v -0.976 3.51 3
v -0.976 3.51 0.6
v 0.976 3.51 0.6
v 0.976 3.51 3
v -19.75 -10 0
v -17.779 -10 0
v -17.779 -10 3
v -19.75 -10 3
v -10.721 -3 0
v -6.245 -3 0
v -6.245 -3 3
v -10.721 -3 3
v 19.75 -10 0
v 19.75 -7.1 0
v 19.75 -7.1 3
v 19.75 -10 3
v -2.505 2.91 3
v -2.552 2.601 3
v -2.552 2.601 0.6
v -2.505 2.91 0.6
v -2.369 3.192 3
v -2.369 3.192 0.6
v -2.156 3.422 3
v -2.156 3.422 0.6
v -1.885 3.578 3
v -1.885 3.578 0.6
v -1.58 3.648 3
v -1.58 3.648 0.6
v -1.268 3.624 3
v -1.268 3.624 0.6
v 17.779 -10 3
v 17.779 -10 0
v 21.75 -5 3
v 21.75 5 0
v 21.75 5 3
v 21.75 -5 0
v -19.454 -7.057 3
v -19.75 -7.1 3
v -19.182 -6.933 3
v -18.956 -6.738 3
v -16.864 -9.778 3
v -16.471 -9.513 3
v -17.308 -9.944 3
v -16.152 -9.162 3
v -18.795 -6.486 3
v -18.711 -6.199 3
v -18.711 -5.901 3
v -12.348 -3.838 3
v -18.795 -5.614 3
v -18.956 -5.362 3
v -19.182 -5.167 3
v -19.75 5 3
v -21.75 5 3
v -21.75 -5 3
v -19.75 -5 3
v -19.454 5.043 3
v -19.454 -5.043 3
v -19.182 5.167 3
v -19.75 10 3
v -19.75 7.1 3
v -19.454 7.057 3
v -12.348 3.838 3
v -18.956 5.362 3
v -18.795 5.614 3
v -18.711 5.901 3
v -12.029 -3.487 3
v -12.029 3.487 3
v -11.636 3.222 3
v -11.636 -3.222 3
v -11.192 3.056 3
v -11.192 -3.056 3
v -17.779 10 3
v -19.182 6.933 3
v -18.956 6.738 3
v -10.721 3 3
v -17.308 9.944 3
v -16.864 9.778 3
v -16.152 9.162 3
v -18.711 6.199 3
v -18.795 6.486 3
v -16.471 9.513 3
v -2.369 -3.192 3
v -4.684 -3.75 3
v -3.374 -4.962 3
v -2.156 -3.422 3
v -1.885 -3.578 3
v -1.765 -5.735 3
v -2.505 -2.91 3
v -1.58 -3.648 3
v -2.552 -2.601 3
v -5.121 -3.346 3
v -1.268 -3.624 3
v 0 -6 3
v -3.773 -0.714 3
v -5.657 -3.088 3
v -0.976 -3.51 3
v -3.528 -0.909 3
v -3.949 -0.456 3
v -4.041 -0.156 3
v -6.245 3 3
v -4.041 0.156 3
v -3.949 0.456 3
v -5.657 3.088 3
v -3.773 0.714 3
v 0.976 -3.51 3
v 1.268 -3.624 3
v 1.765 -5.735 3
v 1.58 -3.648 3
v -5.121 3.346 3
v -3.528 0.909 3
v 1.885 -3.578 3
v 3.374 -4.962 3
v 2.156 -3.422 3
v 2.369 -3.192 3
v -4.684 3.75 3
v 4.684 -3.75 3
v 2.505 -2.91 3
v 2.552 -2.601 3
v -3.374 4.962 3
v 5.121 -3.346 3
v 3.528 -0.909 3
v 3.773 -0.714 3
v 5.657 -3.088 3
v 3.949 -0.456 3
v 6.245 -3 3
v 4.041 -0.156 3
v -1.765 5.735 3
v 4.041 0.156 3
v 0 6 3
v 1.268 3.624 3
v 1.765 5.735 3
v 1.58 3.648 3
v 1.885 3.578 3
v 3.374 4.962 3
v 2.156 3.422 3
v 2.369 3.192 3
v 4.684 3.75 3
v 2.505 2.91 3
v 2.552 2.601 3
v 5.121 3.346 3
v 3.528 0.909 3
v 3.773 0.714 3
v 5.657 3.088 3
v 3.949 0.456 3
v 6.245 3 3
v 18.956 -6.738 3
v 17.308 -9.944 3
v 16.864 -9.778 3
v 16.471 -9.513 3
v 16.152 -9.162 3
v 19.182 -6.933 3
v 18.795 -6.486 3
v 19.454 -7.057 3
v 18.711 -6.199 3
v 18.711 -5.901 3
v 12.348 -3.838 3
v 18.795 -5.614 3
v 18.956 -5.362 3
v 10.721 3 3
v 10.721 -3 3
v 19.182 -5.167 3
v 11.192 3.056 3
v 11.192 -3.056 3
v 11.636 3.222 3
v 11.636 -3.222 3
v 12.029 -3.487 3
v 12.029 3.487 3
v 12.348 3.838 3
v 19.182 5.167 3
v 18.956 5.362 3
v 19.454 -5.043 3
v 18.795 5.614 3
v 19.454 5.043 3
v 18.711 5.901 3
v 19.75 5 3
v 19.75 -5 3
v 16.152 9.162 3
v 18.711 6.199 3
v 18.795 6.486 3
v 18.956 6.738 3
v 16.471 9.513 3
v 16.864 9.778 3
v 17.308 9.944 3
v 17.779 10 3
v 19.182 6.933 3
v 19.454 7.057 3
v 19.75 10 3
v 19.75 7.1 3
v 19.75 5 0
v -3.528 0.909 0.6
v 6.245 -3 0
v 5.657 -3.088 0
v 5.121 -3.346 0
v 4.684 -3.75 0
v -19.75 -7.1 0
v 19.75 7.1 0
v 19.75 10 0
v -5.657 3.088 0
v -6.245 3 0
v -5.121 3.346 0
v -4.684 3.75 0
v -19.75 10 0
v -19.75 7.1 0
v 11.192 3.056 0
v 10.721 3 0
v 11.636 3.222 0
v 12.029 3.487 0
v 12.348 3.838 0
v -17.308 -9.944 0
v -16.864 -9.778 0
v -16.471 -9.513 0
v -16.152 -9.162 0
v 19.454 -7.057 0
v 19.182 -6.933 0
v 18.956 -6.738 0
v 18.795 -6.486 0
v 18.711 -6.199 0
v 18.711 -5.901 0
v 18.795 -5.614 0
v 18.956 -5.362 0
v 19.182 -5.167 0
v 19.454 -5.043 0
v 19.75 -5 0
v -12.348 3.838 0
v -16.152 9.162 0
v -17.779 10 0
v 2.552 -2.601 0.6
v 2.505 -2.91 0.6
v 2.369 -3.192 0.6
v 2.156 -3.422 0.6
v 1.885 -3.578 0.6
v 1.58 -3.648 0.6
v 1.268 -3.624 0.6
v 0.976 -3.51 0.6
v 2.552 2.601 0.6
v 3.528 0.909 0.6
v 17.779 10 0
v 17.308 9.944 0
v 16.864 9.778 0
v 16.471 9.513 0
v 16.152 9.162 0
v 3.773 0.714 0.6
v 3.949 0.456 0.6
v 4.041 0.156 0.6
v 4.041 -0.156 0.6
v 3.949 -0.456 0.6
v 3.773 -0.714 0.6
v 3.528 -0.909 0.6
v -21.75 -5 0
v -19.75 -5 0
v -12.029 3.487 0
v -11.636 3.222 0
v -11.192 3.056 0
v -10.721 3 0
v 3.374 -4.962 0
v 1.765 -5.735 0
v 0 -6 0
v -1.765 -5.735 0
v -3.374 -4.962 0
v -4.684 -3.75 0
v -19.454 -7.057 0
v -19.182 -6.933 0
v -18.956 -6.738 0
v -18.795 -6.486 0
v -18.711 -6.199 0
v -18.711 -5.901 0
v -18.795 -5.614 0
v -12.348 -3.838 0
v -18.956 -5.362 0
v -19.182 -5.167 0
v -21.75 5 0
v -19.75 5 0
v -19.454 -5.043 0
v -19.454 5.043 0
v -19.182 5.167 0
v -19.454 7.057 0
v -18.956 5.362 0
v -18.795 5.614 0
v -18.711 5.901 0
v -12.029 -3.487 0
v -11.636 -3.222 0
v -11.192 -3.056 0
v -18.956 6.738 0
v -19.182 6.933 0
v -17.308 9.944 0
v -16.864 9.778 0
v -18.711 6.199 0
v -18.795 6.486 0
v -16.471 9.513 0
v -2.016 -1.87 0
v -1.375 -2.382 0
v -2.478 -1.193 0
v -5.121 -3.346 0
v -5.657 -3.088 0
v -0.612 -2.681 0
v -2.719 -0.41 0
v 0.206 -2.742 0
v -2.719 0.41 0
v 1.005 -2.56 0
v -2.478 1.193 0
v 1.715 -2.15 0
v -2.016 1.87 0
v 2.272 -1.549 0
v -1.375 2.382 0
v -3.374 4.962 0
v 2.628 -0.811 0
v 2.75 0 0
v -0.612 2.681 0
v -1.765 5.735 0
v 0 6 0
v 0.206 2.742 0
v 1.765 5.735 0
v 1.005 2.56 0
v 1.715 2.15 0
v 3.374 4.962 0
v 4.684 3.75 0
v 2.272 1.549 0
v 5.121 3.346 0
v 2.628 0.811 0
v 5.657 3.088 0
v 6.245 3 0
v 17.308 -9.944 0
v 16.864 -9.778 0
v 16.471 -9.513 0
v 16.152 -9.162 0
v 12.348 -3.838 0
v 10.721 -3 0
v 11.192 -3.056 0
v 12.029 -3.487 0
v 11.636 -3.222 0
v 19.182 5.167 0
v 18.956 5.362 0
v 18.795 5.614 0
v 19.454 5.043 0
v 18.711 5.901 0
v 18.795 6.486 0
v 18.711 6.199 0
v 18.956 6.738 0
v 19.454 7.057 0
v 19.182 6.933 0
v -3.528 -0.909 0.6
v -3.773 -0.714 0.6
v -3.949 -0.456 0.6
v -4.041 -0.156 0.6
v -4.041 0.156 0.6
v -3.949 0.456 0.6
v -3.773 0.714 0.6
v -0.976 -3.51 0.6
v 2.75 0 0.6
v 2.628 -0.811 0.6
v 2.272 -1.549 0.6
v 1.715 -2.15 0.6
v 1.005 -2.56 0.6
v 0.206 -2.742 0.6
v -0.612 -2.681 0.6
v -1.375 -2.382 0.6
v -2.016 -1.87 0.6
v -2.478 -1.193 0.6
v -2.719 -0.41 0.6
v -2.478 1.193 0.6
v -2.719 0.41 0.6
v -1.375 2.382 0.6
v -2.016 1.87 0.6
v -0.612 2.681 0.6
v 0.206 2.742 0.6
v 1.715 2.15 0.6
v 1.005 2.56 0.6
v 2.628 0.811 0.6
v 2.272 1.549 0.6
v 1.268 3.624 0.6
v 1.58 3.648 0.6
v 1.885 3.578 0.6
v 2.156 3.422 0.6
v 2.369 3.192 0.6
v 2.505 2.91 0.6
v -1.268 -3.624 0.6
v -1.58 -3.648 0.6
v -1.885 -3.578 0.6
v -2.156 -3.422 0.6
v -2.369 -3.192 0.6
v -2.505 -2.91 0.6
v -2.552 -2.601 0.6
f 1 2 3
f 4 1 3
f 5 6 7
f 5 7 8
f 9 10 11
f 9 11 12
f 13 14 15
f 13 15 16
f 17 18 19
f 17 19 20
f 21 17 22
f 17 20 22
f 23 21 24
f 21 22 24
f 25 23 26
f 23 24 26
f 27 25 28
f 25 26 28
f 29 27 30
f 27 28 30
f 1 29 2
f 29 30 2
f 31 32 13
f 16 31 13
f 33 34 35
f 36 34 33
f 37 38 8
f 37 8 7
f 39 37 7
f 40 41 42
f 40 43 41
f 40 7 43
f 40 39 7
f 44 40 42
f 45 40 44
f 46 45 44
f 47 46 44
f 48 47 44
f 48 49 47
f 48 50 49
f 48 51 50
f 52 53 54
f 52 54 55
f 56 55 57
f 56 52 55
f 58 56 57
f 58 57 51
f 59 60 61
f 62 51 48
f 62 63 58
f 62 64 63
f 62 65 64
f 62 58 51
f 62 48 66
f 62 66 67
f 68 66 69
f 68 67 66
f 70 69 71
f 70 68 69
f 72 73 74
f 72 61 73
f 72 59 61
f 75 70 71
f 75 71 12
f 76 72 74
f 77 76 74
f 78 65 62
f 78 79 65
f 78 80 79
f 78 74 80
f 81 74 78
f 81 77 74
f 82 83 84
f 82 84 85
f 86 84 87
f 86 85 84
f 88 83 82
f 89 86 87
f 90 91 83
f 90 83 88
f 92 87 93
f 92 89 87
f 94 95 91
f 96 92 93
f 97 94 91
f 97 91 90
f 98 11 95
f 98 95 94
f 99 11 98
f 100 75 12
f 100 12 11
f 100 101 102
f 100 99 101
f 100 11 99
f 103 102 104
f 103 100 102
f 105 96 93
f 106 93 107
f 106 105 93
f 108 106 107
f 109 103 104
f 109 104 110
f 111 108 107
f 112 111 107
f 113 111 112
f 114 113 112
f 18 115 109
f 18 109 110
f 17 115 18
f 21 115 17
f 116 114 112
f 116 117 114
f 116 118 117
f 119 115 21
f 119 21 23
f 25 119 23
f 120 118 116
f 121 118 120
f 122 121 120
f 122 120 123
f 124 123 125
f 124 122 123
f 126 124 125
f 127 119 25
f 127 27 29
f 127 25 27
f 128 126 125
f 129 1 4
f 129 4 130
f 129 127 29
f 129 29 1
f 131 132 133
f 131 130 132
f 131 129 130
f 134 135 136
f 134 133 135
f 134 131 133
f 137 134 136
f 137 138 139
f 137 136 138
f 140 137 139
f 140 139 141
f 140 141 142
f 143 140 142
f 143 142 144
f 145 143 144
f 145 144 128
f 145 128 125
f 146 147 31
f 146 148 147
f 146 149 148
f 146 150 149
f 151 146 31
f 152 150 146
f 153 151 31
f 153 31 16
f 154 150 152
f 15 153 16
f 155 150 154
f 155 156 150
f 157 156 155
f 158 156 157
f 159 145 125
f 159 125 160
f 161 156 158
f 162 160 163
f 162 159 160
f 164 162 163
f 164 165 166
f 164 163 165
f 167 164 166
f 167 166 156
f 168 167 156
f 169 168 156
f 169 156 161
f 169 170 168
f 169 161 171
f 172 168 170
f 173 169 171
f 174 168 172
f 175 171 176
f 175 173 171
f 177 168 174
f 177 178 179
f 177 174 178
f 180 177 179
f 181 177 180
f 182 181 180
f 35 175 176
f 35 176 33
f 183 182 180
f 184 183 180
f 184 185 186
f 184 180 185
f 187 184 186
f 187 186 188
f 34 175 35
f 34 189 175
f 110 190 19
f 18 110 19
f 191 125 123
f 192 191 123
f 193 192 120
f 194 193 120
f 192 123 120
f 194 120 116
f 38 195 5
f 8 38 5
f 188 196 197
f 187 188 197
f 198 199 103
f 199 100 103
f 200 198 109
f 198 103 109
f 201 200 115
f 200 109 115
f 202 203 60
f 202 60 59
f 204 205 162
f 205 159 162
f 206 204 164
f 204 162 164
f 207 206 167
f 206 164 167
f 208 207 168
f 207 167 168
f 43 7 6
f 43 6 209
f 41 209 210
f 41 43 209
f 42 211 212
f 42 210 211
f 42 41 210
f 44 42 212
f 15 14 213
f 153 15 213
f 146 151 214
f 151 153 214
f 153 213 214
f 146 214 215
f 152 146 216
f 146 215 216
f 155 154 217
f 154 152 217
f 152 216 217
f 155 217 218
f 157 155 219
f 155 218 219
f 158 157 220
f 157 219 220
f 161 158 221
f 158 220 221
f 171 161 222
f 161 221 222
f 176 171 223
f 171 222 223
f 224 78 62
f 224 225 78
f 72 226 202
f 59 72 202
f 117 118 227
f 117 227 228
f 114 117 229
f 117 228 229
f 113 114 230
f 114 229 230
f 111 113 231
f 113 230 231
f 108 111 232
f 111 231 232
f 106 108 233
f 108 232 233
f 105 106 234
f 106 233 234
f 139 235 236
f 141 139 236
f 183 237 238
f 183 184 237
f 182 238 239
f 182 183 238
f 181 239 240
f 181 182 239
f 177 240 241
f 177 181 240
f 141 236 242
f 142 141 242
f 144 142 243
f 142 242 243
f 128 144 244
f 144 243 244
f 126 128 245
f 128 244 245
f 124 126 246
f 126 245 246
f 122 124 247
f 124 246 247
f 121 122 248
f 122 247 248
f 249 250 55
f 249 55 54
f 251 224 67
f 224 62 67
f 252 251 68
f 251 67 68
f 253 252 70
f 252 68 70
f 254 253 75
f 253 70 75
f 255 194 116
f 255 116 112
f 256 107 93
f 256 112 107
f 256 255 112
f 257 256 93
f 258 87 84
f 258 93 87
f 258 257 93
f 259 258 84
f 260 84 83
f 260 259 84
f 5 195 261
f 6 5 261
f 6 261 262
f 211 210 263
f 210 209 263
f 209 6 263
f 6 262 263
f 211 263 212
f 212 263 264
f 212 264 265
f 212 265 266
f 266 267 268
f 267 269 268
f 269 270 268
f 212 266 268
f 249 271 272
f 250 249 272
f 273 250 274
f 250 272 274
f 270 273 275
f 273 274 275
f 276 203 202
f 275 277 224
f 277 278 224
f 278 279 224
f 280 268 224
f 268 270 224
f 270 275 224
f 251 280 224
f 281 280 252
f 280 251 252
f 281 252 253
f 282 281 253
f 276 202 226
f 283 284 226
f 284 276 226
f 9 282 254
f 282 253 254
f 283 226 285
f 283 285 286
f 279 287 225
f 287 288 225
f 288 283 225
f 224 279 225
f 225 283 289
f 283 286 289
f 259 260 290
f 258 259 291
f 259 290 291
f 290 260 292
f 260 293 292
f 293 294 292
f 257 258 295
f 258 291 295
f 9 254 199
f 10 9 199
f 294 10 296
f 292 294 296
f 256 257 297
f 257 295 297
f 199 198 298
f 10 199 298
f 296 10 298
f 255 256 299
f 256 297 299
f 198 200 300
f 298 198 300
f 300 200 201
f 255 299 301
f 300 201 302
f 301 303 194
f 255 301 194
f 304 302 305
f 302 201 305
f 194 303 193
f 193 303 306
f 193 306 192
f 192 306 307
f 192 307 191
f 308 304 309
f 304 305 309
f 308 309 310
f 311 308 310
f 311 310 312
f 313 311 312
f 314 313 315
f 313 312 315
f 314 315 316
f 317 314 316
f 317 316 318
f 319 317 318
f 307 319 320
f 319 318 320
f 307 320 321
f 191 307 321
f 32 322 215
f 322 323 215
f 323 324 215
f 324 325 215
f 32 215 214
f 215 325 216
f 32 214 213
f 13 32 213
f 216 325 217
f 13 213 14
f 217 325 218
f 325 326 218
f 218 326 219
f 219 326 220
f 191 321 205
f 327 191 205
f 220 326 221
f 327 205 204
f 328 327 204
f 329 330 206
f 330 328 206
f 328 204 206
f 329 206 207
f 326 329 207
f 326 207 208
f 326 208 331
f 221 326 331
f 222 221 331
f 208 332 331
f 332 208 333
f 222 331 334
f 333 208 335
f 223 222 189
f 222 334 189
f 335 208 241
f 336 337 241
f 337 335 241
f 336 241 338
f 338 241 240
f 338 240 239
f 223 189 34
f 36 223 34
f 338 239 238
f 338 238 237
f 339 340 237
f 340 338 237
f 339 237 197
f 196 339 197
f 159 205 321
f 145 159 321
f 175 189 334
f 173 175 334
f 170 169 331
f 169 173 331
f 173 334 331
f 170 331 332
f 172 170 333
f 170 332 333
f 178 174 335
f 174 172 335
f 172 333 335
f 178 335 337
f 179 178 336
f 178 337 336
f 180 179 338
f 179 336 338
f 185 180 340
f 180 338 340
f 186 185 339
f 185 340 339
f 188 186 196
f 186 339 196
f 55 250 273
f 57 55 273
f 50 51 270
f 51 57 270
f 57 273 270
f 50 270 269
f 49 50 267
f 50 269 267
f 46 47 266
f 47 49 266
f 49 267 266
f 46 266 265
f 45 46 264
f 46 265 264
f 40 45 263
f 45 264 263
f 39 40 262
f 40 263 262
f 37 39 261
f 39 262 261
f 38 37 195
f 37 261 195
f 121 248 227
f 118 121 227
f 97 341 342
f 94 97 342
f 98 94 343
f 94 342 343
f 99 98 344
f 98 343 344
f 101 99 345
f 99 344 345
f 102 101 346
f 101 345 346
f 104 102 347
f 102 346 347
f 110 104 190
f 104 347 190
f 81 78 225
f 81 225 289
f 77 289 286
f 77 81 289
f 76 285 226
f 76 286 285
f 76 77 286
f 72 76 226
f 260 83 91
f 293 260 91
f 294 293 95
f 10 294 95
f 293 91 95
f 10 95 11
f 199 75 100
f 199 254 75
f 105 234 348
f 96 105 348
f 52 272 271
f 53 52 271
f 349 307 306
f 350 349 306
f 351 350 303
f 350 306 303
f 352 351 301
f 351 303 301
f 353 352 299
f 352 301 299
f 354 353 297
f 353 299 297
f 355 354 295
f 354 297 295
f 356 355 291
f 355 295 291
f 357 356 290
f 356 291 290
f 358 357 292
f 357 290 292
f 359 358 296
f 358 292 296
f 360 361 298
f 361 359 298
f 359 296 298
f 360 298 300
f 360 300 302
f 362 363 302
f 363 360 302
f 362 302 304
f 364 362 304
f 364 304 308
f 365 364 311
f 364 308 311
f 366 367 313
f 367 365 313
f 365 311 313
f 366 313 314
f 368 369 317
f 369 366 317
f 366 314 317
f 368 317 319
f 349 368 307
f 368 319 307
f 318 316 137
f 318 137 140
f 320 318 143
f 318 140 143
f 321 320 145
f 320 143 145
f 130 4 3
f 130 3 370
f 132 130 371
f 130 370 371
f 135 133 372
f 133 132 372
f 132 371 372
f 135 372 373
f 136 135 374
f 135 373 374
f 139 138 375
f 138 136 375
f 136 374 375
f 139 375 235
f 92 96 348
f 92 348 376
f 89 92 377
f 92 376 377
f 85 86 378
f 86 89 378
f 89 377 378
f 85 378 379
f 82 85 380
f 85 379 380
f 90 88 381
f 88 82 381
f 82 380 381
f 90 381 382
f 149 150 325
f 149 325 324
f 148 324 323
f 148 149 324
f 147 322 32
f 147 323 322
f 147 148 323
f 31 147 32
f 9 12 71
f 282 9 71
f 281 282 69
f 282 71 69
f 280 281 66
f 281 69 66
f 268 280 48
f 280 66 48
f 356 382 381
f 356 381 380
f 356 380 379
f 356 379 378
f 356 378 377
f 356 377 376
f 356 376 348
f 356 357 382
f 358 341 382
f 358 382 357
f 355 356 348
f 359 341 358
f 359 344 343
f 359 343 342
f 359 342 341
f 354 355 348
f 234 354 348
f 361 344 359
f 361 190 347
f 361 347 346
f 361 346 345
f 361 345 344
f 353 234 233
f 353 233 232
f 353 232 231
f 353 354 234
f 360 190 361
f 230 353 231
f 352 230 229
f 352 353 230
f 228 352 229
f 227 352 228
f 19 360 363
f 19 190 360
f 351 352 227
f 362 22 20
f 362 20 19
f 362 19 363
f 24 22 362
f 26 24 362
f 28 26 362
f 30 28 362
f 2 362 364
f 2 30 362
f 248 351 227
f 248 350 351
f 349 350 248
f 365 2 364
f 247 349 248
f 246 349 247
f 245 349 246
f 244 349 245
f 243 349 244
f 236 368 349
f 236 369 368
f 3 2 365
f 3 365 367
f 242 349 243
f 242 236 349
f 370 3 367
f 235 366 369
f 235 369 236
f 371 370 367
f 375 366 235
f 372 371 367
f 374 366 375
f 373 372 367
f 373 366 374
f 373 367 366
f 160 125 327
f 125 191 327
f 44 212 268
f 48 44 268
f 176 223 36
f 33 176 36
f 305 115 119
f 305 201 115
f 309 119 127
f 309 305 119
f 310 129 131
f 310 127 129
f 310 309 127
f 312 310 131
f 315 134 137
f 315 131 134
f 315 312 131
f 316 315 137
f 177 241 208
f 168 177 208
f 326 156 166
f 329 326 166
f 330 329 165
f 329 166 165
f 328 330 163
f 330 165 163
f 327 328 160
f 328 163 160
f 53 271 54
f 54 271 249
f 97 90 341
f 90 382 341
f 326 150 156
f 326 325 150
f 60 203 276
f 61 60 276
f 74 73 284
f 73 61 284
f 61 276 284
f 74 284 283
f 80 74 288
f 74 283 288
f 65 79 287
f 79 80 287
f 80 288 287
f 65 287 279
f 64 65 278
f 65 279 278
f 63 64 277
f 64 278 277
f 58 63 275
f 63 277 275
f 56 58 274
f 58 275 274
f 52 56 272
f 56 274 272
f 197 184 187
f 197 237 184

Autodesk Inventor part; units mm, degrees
ref_plane "YZ Plane" through (0, 0, 0) normal (1, 0, 0) x (0, 1, 0)
ref_plane "XZ Plane" through (0, 0, 0) normal (0, 1, 0) x (-1, 0, 0)
ref_plane "XY Plane" through (0, 0, 0) normal (0, 0, 1) x (1, 0, 0)
sketch "スケッチ1" plane through (0, 0, 0) normal (0, 0, 1) x (1, 0, 0)
  line L0 (-19.75, 10) -> (19.75, 10) construction
  line L1 (19.75, 10) -> (19.75, -10) construction
  line L2 (19.75, -10) -> (-19.75, -10) construction
  line L3 (-19.75, -10) -> (-19.75, 10) construction
  line L4 (-19.75, 10) -> (19.75, -10) construction
  line L5 (19.75, 10) -> (-19.75, -10) construction
  line L6 (-19.75, 5) -> (-21.75, 5)
  line L7 (-21.75, 5) -> (-21.75, -5)
  line L8 (-19.75, 0) -> (19.75, 0) construction
  line L9 (0, 10) -> (0, -10) construction
  circle A0 centre (0, 0) radius 2.75
  arc A1 (-19.75, 5) -> (-19.75, 7.1) centre (-19.75, 6.05) ccw
  line L10 (-16.75, 10) -> (-11.75, 3)
  line L11 (-19.75, -5) -> (-21.75, -5)
  arc A2 (-19.75, -7.1) -> (-19.75, -5) centre (-19.75, -6.05) ccw
  line L12 (-16.75, -10) -> (-11.75, -3)
  line L13 (-19.75, 7.1) -> (-19.75, 10)
  line L14 (-16.75, 10) -> (-19.75, 10)
  line L15 (-16.75, -10) -> (-19.75, -10)
  line L16 (-19.75, -7.1) -> (-19.75, -10)
  line L17 (19.75, 5) -> (21.75, 5)
  line L18 (21.75, 5) -> (21.75, -5)
  arc A3 (19.75, 7.1) -> (19.75, 5) centre (19.75, 6.05) ccw
  line L19 (16.75, 10) -> (11.75, 3)
  line L20 (19.75, -5) -> (21.75, -5)
  arc A4 (19.75, -5) -> (19.75, -7.1) centre (19.75, -6.05) ccw
  line L21 (16.75, -10) -> (11.75, -3)
  line L22 (19.75, 7.1) -> (19.75, 10)
  line L23 (16.75, 10) -> (19.75, 10)
  line L24 (16.75, -10) -> (19.75, -10)
  line L25 (19.75, -7.1) -> (19.75, -10)
  arc A5 (5.1962, 3) -> (-5.1962, 3) centre (0, 0) ccw
  arc A6 (-5.1962, -3) -> (5.1962, -3) centre (0, 0) ccw
  line L26 (-2.0265, -3.51) -> (-2.5515, -2.6007) construction
  line L27 (-4.053, 0) -> (-3.528, 0.9093) construction
  line L28 (-2.0265, 3.51) -> (-0.9765, 3.51) construction
  line L29 (2.0265, 3.51) -> (2.5515, 2.6007) construction
  line L30 (4.053, 0) -> (3.528, -0.9093) construction
  line L31 (2.0265, -3.51) -> (0.9765, -3.51) construction
  arc A7 (-3.528, 0.9093) -> (-3.528, -0.9093) centre (-3.003, 0) ccw
  arc A8 (-2.5515, -2.6007) -> (-0.9765, -3.51) centre (-1.5015, -2.6007) ccw
  arc A9 (0.9765, -3.51) -> (2.5515, -2.6007) centre (1.5015, -2.6007) ccw
  arc A10 (3.528, -0.9093) -> (3.528, 0.9093) centre (3.003, 0) ccw
  arc A11 (2.5515, 2.6007) -> (0.9765, 3.51) centre (1.5015, 2.6007) ccw
  arc A12 (-0.9765, 3.51) -> (-2.5515, 2.6007) centre (-1.5015, 2.6007) ccw
  line L32 (-2.5515, 2.6007) -> (-2.0265, 3.51) construction
  line L33 (-3.528, 0.9093) -> (-2.5515, 2.6007)
  line L34 (-3.528, -0.9093) -> (-4.053, 0) construction
  line L35 (-2.5515, -2.6007) -> (-3.528, -0.9093)
  line L36 (-0.9765, -3.51) -> (-2.0265, -3.51) construction
  line L37 (0.9765, -3.51) -> (-0.9765, -3.51)
  line L38 (2.5515, -2.6007) -> (2.0265, -3.51) construction
  line L39 (3.528, -0.9093) -> (2.5515, -2.6007)
  line L40 (3.528, 0.9093) -> (4.053, 0) construction
  line L41 (2.5515, 2.6007) -> (3.528, 0.9093)
  line L42 (0.9765, 3.51) -> (2.0265, 3.51) construction
  line L43 (-0.9765, 3.51) -> (0.9765, 3.51)
  line L44 (-11.75, 3) -> (-5.1962, 3)
  line L45 (-5.1962, -3) -> (-11.75, -3)
  line L46 (5.1962, -3) -> (11.75, -3)
  line L47 (11.75, 3) -> (5.1962, 3)
  point P0 (0, 0)
  dimension "d0" = 39.5
  dimension "d3" = 5.5
  dimension "d4" = 2
  dimension "d5" = 10
  dimension "d6" = 1.05
  dimension "d7" = 3
  dimension "d9" = 5
  dimension "d11" = 8
  dimension "d12" = 6
  dimension "d14" = 1.05
  dimension "d17" = 360
  dimension "d19" = 7.02
  dimension "d20" = 6
extrude "押し出し1" add sketch "スケッチ1" along normal blind 3 contours A1 L13 L14 L10 L44 A5 L47 L19 L23 L22 A3 L17 L18 L20 A4 L25 L24 L21 L46 A6 L45 L12 L15 L16 A2 L11 L7 L6
extrude "押し出し2" add sketch "スケッチ1" along normal blind 0.6 contours L33 A12 L43 A11 L41 A10 L39 A9 L37 A8 L35 A7
fillet "フィレット1" radius 2 12 edges at (-11.75, 3, 1.5) (-11.75, -3, 1.5) (-16.75, 10, 1.5) (-16.75, -10, 1.5) (-5.1962, -3, 1.5) (-5.1962, 3, 1.5) (5.1962, 3, 1.5) (5.1962, -3, 1.5) (11.75, 3, 1.5) (11.75, -3, 1.5) (16.75, 10, 1.5) (16.75, -10, 1.5)
properties part number "Ankle_front_frame" material "アルミニウム 2014-T4"
